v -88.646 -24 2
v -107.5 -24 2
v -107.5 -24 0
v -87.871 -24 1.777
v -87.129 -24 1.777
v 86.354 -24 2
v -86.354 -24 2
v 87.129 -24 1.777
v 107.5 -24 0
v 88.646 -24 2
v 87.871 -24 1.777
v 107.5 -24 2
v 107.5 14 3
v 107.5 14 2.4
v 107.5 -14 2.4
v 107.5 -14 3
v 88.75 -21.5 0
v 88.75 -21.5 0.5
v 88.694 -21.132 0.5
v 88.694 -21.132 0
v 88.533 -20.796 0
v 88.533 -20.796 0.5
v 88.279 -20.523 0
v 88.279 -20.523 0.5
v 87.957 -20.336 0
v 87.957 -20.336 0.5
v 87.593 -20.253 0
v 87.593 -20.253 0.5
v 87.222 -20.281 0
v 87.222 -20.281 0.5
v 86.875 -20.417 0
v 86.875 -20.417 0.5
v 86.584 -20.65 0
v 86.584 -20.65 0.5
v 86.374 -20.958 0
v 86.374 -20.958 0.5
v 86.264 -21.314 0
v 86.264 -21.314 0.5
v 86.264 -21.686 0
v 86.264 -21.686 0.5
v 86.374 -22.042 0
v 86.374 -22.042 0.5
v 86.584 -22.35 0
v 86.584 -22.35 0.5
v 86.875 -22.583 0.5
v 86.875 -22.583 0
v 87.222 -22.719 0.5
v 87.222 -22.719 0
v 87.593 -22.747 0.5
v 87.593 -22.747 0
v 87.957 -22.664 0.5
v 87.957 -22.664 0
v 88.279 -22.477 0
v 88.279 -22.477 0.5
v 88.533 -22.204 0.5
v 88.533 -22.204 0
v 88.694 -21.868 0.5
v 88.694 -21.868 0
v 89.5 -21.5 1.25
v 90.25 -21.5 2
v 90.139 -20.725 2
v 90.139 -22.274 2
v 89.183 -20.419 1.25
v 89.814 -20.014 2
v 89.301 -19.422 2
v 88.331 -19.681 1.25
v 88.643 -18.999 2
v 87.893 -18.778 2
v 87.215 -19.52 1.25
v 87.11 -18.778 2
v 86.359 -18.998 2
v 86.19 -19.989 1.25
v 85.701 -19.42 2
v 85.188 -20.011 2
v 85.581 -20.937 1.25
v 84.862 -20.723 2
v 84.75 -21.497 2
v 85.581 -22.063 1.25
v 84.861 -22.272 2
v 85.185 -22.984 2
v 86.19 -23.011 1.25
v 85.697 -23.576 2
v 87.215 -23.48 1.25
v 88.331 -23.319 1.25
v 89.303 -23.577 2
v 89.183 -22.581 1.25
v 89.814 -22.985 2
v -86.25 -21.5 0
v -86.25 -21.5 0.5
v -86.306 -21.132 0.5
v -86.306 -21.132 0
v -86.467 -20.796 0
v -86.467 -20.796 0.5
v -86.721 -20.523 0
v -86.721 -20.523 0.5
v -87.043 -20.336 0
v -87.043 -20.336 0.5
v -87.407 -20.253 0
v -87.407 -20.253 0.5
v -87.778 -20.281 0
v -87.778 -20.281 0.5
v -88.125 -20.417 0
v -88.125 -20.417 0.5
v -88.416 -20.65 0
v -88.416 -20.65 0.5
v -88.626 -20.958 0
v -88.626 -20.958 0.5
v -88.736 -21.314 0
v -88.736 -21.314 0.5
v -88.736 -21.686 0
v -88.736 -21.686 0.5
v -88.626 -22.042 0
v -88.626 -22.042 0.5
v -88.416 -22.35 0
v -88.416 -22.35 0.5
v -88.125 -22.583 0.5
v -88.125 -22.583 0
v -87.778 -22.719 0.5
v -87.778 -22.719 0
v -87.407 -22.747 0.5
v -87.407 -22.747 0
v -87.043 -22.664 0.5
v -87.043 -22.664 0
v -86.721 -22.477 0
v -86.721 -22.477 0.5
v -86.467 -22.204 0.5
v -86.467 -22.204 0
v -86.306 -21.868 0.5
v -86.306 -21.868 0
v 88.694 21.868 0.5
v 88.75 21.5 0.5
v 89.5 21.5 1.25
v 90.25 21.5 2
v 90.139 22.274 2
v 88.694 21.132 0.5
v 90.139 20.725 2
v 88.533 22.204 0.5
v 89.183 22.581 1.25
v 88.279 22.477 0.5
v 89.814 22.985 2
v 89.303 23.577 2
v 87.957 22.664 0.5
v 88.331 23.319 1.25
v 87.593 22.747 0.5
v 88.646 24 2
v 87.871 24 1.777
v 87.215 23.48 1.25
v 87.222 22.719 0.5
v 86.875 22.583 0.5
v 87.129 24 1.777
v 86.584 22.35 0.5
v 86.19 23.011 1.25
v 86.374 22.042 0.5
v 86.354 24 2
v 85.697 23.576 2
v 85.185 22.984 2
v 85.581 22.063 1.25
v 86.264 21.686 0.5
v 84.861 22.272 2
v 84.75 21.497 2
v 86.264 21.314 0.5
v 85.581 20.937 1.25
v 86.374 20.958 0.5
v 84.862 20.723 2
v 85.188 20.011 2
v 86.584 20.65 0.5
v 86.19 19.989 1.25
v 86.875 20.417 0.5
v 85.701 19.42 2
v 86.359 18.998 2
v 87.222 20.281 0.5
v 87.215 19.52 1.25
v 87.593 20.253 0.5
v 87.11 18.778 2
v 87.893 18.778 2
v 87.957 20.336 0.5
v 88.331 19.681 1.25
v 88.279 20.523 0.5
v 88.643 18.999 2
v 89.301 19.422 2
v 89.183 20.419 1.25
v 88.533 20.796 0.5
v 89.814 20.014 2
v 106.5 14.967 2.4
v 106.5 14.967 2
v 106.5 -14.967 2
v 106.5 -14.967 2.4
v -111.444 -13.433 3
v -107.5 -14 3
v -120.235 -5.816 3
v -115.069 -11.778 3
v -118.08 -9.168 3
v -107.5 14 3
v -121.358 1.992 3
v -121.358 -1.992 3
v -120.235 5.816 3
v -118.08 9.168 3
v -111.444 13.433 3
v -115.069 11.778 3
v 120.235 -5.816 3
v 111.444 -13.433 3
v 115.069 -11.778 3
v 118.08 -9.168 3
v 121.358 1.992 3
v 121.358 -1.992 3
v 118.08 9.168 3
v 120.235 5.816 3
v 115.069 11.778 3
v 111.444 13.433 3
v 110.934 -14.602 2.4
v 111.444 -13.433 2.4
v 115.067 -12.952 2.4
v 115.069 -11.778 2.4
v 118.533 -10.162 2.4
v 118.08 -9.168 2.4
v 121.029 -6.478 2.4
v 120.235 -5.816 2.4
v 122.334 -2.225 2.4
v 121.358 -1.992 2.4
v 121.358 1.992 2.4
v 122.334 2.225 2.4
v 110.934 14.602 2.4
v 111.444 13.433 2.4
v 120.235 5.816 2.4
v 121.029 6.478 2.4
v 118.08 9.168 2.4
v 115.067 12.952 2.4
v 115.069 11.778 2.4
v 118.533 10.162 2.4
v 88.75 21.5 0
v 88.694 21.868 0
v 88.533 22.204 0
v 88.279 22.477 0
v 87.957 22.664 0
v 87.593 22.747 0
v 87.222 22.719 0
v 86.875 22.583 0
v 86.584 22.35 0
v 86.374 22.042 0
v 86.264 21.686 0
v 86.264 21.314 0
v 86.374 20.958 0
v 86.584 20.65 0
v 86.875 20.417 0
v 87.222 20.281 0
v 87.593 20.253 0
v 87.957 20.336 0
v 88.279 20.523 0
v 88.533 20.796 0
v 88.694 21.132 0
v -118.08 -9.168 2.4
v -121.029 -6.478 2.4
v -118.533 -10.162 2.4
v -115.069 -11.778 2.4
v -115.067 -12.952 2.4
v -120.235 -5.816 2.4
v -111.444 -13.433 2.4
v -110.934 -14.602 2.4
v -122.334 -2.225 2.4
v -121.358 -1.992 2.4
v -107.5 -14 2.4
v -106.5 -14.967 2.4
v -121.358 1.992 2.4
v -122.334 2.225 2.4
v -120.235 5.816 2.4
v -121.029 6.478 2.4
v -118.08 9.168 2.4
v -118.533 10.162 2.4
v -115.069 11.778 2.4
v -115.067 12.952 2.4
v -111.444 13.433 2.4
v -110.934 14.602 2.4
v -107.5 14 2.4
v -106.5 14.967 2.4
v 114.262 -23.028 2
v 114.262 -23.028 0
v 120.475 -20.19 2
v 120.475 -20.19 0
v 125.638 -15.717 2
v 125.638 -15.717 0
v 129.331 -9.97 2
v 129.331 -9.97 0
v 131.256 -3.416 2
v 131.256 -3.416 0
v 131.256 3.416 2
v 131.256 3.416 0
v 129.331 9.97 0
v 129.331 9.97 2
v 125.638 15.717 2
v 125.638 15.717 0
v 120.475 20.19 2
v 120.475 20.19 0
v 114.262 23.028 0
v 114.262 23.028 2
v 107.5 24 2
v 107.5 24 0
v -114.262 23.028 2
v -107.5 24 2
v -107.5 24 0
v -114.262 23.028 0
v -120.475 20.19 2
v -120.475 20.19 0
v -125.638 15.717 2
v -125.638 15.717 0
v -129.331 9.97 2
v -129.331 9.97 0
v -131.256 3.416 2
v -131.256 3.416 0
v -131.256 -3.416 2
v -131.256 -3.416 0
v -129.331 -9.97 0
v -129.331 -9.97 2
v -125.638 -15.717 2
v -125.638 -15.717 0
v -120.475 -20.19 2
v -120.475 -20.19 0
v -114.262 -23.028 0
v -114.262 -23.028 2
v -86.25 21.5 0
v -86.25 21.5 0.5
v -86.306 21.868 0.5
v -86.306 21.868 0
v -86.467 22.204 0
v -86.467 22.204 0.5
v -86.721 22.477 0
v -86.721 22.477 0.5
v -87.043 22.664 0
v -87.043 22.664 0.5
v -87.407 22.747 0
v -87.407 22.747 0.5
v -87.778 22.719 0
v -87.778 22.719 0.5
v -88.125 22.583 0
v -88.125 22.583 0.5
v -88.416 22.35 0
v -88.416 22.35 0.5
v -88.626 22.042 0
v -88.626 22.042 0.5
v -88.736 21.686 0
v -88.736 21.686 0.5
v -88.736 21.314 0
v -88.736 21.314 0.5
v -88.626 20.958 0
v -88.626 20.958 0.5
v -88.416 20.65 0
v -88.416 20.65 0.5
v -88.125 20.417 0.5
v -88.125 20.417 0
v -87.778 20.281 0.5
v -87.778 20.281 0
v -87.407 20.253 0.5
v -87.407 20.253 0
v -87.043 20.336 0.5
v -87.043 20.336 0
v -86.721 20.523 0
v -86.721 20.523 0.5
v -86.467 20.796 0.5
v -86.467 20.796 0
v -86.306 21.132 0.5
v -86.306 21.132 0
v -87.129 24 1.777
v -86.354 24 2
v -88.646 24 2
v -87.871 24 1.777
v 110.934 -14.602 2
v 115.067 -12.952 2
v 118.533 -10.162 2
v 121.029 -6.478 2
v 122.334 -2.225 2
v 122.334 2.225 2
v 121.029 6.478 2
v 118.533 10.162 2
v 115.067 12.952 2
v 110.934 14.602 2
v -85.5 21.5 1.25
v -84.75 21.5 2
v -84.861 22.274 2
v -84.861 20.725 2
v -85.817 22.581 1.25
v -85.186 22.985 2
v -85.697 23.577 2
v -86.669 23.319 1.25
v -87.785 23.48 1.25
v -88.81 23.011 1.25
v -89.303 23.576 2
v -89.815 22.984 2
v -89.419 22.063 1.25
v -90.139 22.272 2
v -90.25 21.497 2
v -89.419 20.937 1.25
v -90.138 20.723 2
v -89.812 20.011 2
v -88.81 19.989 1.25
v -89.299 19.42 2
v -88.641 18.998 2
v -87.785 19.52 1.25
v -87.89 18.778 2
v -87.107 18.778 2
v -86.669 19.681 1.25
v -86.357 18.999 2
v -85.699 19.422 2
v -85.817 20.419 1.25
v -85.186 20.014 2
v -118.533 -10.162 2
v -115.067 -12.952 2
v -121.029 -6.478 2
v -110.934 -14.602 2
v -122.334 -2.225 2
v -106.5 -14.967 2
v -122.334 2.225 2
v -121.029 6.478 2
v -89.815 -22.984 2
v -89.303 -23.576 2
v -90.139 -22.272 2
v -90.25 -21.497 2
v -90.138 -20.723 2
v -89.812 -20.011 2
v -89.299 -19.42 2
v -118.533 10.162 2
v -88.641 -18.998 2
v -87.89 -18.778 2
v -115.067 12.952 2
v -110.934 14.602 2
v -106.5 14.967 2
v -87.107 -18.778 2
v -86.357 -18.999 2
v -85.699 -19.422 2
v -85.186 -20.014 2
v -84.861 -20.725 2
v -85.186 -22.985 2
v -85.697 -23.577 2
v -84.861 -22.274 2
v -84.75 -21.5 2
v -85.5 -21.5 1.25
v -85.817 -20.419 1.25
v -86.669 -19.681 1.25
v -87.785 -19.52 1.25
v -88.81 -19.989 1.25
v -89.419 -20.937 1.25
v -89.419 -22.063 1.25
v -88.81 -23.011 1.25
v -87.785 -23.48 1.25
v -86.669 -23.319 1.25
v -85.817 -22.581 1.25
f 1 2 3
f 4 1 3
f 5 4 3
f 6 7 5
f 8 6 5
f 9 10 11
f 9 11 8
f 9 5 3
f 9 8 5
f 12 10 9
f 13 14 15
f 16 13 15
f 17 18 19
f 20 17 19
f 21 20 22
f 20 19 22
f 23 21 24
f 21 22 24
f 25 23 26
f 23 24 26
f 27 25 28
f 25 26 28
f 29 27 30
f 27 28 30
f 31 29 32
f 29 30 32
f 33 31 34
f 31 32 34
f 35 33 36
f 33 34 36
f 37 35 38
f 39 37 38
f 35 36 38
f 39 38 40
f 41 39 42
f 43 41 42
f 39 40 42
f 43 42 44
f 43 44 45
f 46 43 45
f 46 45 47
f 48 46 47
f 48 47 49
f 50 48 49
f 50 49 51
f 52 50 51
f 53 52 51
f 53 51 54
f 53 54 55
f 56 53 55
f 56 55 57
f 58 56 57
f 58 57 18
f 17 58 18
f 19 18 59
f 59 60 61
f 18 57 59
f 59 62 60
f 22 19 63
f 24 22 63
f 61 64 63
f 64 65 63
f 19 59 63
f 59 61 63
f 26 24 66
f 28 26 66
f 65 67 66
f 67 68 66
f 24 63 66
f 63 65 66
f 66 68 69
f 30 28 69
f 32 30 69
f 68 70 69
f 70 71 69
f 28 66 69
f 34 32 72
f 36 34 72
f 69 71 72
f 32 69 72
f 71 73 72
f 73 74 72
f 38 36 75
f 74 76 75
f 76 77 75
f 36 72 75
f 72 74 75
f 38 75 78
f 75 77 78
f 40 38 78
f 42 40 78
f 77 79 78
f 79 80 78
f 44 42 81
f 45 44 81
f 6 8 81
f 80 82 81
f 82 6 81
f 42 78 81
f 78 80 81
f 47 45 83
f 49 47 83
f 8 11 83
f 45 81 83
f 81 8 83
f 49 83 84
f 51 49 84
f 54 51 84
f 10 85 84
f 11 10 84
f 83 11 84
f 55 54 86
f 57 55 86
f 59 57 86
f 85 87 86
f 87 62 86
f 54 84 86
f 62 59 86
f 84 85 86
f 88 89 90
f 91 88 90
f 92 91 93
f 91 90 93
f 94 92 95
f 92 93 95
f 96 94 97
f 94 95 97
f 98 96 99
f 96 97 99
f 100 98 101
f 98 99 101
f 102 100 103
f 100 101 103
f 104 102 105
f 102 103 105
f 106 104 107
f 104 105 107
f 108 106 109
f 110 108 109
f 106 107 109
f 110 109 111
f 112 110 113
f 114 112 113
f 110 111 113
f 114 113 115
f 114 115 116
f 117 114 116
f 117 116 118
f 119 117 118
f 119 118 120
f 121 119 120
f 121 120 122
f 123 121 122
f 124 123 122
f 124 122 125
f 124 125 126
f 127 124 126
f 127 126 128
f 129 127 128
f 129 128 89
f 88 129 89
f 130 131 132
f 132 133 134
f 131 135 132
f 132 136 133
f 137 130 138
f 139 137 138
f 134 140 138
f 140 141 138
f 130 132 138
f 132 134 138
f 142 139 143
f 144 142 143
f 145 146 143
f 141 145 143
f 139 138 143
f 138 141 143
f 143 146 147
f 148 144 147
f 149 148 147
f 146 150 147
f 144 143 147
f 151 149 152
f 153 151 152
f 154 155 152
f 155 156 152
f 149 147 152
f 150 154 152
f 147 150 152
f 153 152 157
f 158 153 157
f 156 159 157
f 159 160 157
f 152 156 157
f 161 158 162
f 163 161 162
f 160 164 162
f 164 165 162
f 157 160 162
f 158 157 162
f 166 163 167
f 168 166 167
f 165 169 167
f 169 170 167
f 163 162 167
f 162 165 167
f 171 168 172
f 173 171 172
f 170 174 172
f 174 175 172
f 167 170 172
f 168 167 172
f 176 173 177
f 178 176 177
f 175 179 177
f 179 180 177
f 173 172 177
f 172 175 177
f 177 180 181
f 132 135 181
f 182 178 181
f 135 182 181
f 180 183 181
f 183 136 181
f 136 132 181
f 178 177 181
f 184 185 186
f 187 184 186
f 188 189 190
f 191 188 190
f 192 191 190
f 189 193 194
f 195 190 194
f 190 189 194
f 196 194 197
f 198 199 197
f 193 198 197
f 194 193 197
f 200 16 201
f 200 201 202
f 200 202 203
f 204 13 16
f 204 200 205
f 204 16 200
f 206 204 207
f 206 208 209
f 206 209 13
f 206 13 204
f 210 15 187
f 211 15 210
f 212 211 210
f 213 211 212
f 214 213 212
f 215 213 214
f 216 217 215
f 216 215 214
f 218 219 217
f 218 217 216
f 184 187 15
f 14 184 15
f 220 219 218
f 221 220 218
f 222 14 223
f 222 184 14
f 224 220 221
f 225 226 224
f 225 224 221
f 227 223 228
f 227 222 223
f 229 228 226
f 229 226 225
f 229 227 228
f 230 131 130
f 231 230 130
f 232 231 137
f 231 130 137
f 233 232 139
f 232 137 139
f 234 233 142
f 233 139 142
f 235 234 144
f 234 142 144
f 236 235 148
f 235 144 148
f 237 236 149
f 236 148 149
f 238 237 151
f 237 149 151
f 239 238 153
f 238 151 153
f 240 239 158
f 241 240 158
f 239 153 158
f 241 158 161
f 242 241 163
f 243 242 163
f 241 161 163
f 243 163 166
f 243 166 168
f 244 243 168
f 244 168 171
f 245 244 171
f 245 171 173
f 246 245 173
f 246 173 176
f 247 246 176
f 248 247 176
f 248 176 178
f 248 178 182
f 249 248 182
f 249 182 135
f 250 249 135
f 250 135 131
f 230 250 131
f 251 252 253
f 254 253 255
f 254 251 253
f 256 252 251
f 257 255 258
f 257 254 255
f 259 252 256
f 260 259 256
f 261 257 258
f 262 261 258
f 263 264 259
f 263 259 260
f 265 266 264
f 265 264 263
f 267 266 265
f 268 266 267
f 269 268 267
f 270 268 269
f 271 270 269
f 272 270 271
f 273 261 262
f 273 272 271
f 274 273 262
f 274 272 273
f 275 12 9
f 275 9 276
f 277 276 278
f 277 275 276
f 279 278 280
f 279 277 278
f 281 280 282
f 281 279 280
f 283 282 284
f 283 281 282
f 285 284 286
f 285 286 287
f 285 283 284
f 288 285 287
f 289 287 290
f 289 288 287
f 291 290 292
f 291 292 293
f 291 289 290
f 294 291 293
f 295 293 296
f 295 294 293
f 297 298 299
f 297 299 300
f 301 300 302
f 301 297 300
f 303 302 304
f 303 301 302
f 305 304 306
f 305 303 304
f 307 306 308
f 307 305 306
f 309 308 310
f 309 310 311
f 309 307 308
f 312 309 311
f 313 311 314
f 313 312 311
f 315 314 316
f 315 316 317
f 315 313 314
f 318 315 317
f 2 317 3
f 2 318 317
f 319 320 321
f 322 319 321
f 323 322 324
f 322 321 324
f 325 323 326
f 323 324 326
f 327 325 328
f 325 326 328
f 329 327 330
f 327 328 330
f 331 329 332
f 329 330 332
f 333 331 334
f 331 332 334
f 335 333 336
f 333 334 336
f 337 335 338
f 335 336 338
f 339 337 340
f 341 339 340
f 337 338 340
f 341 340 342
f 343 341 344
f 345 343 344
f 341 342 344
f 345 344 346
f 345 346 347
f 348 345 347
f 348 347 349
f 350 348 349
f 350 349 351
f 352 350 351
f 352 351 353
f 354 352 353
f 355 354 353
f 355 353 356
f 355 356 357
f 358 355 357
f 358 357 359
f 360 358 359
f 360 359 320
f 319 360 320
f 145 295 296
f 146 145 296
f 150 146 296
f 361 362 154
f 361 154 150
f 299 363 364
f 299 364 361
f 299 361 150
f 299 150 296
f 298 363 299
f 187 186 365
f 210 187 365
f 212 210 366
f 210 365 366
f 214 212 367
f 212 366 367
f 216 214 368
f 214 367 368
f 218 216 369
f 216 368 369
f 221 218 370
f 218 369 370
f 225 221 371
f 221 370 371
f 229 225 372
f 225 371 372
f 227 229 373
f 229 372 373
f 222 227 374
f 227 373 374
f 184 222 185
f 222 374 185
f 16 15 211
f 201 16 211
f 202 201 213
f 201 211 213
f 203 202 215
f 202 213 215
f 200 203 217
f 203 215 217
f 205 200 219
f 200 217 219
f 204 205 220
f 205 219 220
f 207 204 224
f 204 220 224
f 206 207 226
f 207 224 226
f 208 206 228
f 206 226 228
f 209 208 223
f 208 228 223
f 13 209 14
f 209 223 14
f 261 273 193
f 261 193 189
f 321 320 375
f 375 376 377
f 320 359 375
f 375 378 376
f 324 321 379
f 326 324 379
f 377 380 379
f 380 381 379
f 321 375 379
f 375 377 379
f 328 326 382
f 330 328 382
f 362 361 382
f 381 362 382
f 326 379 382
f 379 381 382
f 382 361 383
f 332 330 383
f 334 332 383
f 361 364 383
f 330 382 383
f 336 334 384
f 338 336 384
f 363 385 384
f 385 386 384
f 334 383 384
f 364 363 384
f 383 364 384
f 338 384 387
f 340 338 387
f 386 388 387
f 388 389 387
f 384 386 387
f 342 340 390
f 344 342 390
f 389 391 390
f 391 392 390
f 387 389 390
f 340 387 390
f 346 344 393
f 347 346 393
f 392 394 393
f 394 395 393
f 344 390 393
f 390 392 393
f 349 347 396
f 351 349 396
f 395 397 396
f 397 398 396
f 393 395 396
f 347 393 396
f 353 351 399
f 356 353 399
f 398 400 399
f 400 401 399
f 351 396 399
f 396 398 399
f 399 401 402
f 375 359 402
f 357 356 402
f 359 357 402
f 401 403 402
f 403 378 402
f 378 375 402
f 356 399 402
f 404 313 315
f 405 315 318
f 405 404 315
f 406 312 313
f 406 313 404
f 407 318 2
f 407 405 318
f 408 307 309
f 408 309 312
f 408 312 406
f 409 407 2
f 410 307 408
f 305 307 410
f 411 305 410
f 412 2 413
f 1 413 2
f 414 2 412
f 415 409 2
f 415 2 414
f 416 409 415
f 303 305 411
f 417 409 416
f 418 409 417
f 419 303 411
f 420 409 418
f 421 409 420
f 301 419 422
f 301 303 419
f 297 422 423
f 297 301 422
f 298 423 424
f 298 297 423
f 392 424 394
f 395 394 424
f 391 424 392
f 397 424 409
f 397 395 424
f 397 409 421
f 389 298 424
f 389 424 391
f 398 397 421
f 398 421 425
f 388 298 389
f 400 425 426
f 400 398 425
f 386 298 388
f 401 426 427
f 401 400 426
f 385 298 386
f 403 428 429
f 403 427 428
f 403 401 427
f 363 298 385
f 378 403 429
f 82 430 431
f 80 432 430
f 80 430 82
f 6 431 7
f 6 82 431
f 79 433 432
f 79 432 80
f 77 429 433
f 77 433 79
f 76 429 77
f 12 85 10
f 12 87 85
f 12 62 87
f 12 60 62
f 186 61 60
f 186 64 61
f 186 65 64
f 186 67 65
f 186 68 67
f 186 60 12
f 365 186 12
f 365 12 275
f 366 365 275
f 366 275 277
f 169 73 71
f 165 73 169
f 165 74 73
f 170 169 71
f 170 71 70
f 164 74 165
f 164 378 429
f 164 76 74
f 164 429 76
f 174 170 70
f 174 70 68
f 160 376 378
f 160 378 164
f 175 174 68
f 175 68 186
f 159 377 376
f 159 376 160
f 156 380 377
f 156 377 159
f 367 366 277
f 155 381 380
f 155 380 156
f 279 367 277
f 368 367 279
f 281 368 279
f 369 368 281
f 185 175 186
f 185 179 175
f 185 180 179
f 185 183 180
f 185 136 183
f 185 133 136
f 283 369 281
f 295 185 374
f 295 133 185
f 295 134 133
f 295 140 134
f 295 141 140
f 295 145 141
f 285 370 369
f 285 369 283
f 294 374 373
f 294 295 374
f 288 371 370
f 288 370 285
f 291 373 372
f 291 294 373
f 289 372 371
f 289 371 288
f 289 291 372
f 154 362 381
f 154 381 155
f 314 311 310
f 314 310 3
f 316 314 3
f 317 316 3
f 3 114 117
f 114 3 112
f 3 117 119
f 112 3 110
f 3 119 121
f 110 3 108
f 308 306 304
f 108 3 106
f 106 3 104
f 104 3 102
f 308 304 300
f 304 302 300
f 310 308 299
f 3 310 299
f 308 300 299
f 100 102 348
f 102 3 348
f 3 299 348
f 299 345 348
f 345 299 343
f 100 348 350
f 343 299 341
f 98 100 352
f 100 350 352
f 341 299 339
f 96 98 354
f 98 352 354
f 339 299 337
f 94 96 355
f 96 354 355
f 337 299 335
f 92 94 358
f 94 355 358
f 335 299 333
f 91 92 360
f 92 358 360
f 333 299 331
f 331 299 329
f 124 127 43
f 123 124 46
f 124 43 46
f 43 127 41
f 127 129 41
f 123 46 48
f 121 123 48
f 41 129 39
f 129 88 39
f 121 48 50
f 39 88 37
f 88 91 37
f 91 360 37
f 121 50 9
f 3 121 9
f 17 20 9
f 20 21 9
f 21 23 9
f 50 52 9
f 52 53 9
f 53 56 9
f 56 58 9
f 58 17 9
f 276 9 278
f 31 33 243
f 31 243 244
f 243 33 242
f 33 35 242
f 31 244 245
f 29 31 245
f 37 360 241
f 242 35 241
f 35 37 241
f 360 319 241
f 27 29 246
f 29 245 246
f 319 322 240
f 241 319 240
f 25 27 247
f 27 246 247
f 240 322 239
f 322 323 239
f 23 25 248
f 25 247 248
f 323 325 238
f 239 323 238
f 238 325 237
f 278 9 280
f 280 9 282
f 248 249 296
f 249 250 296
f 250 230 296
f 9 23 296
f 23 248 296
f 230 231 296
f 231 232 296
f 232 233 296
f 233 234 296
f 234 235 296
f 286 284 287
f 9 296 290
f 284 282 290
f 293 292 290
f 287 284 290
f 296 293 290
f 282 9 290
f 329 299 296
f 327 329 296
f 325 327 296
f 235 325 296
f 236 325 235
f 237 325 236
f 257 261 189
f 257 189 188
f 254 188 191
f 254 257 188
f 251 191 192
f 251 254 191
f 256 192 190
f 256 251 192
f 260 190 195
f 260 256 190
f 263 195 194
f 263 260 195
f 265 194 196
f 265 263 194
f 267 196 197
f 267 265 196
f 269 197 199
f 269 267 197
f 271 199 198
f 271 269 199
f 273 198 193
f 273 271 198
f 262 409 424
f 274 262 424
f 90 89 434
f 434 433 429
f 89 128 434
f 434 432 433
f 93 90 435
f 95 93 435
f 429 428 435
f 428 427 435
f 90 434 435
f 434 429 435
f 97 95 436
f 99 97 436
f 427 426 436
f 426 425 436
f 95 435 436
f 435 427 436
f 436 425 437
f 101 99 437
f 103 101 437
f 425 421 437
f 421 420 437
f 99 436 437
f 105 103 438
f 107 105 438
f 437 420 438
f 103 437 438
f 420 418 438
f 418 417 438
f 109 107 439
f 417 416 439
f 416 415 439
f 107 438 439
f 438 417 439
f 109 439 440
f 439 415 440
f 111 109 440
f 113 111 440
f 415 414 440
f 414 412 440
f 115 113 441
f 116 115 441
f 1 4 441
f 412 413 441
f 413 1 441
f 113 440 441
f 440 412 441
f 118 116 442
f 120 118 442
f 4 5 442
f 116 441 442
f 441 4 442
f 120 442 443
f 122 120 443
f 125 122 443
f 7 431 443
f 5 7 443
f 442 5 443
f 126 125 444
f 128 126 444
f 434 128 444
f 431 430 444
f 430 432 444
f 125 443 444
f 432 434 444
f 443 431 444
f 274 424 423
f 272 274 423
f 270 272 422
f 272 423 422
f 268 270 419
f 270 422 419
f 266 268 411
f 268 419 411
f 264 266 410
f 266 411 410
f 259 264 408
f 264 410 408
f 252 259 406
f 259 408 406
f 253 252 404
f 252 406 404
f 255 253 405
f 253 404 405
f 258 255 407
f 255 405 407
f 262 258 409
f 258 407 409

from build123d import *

# Parameters (mm, degrees)
CROQUIS2_R              = 1.25
SALIENTE_EXTRUIR1_DEPTH = 2
CHAFL_N1_SIZE           = 1.5
SALIENTE_EXTRUIR2_DEPTH = 1
SALIENTE_EXTRUIR3_DEPTH = 0.4


with BuildPart() as part:
    # Croquis2 → Saliente-Extruir1 (new body)
    with BuildSketch(Plane.XY.offset(2)):
        with BuildLine():
            Line((-107.5, -24), (107.5, -24))
            ThreePointArc((107.5, -24), (131.5, 0), (107.5, 24))
            Line((107.5, 24), (-107.5, 24))
            ThreePointArc((-107.5, 24), (-131.5, 0), (-107.5, -24))
        make_face()
        with Locations((-87.5, -21.5)):
            Circle(CROQUIS2_R, mode=Mode.SUBTRACT)
        with Locations((-87.5, 21.5)):
            Circle(CROQUIS2_R, mode=Mode.SUBTRACT)
        with Locations((87.5, 21.5)):
            Circle(CROQUIS2_R, mode=Mode.SUBTRACT)
        with Locations((87.5, -21.5)):
            Circle(CROQUIS2_R, mode=Mode.SUBTRACT)
    extrude(amount=-SALIENTE_EXTRUIR1_DEPTH)

    # Chaflán1
    # the kernel refuses this chamfer: 1.5 mm, written as the material it takes off along each edge
    with BuildSketch(Plane(origin=(-87.5, -21.5, 2), x_dir=(1, 0, 0), z_dir=(0, -1, 0))) as chafl_n1_piece_1:
        Polygon((1.25, -CHAFL_N1_SIZE), (1.25 + CHAFL_N1_SIZE, 0), (1.25, 0), align=None)
    revolve(axis=Axis((-87.5, -21.5, 2), (0, 0, 1)), mode=Mode.SUBTRACT)
    with BuildSketch(Plane(origin=(-87.5, 21.5, 2), x_dir=(1, 0, 0), z_dir=(0, -1, 0))) as chafl_n1_piece_2:
        Polygon((1.25, -CHAFL_N1_SIZE), (1.25 + CHAFL_N1_SIZE, 0), (1.25, 0), align=None)
    revolve(axis=Axis((-87.5, 21.5, 2), (0, 0, 1)), mode=Mode.SUBTRACT)
    with BuildSketch(Plane(origin=(87.5, 21.5, 2), x_dir=(1, 0, 0), z_dir=(0, -1, 0))) as chafl_n1_piece_3:
        Polygon((1.25, -CHAFL_N1_SIZE), (1.25 + CHAFL_N1_SIZE, 0), (1.25, 0), align=None)
    revolve(axis=Axis((87.5, 21.5, 2), (0, 0, 1)), mode=Mode.SUBTRACT)
    with BuildSketch(Plane(origin=(87.5, -21.5, 2), x_dir=(1, 0, 0), z_dir=(0, -1, 0))) as chafl_n1_piece_4:
        Polygon((1.25, -CHAFL_N1_SIZE), (1.25 + CHAFL_N1_SIZE, 0), (1.25, 0), align=None)
    revolve(axis=Axis((87.5, -21.5, 2), (0, 0, 1)), mode=Mode.SUBTRACT)

    # Croquis3 → Saliente-Extruir2 (add)
    with BuildSketch(Plane.XY.offset(2)):
        with BuildLine():
            Line((-107.5, 14), (-107.5, -14))
            ThreePointArc((-107.5, -14), (-121.5, 0), (-107.5, 14))
        make_face()
        with BuildLine():
            Line((107.5, 14), (107.5, -14))
            ThreePointArc((107.5, -14), (121.5, 0), (107.5, 14))
        make_face()
    extrude(amount=SALIENTE_EXTRUIR2_DEPTH)

    # Croquis4 → Saliente-Extruir3 (add)
    # profile 1 of 2: a face of its own
    with BuildSketch(Plane.XY.offset(2)):
        with BuildLine():
            Line((-106.5, -14.966629547), (-106.5, 14.966629547))
            ThreePointArc((-106.5, 14.966629547), (-122.5, 0), (-106.5, -14.966629547))
        make_face()
        with BuildLine():
            Line((-107.5, -14), (-107.5, 14))
            ThreePointArc((-107.5, 14), (-121.5, 0), (-107.5, -14))
        make_face(mode=Mode.SUBTRACT)
    # profile 2 of 2: a face of its own
    with BuildSketch(Plane.XY.offset(2)):
        with BuildLine():
            Line((106.5, 14.966629547), (106.5, -14.966629547))
            ThreePointArc((106.5, -14.966629547), (122.5, 0), (106.5, 14.966629547))
        make_face()
        with BuildLine():
            Line((107.5, 14), (107.5, -14))
            ThreePointArc((107.5, -14), (121.5, 0), (107.5, 14))
        make_face(mode=Mode.SUBTRACT)
    extrude(amount=SALIENTE_EXTRUIR3_DEPTH)


solid = part.part
